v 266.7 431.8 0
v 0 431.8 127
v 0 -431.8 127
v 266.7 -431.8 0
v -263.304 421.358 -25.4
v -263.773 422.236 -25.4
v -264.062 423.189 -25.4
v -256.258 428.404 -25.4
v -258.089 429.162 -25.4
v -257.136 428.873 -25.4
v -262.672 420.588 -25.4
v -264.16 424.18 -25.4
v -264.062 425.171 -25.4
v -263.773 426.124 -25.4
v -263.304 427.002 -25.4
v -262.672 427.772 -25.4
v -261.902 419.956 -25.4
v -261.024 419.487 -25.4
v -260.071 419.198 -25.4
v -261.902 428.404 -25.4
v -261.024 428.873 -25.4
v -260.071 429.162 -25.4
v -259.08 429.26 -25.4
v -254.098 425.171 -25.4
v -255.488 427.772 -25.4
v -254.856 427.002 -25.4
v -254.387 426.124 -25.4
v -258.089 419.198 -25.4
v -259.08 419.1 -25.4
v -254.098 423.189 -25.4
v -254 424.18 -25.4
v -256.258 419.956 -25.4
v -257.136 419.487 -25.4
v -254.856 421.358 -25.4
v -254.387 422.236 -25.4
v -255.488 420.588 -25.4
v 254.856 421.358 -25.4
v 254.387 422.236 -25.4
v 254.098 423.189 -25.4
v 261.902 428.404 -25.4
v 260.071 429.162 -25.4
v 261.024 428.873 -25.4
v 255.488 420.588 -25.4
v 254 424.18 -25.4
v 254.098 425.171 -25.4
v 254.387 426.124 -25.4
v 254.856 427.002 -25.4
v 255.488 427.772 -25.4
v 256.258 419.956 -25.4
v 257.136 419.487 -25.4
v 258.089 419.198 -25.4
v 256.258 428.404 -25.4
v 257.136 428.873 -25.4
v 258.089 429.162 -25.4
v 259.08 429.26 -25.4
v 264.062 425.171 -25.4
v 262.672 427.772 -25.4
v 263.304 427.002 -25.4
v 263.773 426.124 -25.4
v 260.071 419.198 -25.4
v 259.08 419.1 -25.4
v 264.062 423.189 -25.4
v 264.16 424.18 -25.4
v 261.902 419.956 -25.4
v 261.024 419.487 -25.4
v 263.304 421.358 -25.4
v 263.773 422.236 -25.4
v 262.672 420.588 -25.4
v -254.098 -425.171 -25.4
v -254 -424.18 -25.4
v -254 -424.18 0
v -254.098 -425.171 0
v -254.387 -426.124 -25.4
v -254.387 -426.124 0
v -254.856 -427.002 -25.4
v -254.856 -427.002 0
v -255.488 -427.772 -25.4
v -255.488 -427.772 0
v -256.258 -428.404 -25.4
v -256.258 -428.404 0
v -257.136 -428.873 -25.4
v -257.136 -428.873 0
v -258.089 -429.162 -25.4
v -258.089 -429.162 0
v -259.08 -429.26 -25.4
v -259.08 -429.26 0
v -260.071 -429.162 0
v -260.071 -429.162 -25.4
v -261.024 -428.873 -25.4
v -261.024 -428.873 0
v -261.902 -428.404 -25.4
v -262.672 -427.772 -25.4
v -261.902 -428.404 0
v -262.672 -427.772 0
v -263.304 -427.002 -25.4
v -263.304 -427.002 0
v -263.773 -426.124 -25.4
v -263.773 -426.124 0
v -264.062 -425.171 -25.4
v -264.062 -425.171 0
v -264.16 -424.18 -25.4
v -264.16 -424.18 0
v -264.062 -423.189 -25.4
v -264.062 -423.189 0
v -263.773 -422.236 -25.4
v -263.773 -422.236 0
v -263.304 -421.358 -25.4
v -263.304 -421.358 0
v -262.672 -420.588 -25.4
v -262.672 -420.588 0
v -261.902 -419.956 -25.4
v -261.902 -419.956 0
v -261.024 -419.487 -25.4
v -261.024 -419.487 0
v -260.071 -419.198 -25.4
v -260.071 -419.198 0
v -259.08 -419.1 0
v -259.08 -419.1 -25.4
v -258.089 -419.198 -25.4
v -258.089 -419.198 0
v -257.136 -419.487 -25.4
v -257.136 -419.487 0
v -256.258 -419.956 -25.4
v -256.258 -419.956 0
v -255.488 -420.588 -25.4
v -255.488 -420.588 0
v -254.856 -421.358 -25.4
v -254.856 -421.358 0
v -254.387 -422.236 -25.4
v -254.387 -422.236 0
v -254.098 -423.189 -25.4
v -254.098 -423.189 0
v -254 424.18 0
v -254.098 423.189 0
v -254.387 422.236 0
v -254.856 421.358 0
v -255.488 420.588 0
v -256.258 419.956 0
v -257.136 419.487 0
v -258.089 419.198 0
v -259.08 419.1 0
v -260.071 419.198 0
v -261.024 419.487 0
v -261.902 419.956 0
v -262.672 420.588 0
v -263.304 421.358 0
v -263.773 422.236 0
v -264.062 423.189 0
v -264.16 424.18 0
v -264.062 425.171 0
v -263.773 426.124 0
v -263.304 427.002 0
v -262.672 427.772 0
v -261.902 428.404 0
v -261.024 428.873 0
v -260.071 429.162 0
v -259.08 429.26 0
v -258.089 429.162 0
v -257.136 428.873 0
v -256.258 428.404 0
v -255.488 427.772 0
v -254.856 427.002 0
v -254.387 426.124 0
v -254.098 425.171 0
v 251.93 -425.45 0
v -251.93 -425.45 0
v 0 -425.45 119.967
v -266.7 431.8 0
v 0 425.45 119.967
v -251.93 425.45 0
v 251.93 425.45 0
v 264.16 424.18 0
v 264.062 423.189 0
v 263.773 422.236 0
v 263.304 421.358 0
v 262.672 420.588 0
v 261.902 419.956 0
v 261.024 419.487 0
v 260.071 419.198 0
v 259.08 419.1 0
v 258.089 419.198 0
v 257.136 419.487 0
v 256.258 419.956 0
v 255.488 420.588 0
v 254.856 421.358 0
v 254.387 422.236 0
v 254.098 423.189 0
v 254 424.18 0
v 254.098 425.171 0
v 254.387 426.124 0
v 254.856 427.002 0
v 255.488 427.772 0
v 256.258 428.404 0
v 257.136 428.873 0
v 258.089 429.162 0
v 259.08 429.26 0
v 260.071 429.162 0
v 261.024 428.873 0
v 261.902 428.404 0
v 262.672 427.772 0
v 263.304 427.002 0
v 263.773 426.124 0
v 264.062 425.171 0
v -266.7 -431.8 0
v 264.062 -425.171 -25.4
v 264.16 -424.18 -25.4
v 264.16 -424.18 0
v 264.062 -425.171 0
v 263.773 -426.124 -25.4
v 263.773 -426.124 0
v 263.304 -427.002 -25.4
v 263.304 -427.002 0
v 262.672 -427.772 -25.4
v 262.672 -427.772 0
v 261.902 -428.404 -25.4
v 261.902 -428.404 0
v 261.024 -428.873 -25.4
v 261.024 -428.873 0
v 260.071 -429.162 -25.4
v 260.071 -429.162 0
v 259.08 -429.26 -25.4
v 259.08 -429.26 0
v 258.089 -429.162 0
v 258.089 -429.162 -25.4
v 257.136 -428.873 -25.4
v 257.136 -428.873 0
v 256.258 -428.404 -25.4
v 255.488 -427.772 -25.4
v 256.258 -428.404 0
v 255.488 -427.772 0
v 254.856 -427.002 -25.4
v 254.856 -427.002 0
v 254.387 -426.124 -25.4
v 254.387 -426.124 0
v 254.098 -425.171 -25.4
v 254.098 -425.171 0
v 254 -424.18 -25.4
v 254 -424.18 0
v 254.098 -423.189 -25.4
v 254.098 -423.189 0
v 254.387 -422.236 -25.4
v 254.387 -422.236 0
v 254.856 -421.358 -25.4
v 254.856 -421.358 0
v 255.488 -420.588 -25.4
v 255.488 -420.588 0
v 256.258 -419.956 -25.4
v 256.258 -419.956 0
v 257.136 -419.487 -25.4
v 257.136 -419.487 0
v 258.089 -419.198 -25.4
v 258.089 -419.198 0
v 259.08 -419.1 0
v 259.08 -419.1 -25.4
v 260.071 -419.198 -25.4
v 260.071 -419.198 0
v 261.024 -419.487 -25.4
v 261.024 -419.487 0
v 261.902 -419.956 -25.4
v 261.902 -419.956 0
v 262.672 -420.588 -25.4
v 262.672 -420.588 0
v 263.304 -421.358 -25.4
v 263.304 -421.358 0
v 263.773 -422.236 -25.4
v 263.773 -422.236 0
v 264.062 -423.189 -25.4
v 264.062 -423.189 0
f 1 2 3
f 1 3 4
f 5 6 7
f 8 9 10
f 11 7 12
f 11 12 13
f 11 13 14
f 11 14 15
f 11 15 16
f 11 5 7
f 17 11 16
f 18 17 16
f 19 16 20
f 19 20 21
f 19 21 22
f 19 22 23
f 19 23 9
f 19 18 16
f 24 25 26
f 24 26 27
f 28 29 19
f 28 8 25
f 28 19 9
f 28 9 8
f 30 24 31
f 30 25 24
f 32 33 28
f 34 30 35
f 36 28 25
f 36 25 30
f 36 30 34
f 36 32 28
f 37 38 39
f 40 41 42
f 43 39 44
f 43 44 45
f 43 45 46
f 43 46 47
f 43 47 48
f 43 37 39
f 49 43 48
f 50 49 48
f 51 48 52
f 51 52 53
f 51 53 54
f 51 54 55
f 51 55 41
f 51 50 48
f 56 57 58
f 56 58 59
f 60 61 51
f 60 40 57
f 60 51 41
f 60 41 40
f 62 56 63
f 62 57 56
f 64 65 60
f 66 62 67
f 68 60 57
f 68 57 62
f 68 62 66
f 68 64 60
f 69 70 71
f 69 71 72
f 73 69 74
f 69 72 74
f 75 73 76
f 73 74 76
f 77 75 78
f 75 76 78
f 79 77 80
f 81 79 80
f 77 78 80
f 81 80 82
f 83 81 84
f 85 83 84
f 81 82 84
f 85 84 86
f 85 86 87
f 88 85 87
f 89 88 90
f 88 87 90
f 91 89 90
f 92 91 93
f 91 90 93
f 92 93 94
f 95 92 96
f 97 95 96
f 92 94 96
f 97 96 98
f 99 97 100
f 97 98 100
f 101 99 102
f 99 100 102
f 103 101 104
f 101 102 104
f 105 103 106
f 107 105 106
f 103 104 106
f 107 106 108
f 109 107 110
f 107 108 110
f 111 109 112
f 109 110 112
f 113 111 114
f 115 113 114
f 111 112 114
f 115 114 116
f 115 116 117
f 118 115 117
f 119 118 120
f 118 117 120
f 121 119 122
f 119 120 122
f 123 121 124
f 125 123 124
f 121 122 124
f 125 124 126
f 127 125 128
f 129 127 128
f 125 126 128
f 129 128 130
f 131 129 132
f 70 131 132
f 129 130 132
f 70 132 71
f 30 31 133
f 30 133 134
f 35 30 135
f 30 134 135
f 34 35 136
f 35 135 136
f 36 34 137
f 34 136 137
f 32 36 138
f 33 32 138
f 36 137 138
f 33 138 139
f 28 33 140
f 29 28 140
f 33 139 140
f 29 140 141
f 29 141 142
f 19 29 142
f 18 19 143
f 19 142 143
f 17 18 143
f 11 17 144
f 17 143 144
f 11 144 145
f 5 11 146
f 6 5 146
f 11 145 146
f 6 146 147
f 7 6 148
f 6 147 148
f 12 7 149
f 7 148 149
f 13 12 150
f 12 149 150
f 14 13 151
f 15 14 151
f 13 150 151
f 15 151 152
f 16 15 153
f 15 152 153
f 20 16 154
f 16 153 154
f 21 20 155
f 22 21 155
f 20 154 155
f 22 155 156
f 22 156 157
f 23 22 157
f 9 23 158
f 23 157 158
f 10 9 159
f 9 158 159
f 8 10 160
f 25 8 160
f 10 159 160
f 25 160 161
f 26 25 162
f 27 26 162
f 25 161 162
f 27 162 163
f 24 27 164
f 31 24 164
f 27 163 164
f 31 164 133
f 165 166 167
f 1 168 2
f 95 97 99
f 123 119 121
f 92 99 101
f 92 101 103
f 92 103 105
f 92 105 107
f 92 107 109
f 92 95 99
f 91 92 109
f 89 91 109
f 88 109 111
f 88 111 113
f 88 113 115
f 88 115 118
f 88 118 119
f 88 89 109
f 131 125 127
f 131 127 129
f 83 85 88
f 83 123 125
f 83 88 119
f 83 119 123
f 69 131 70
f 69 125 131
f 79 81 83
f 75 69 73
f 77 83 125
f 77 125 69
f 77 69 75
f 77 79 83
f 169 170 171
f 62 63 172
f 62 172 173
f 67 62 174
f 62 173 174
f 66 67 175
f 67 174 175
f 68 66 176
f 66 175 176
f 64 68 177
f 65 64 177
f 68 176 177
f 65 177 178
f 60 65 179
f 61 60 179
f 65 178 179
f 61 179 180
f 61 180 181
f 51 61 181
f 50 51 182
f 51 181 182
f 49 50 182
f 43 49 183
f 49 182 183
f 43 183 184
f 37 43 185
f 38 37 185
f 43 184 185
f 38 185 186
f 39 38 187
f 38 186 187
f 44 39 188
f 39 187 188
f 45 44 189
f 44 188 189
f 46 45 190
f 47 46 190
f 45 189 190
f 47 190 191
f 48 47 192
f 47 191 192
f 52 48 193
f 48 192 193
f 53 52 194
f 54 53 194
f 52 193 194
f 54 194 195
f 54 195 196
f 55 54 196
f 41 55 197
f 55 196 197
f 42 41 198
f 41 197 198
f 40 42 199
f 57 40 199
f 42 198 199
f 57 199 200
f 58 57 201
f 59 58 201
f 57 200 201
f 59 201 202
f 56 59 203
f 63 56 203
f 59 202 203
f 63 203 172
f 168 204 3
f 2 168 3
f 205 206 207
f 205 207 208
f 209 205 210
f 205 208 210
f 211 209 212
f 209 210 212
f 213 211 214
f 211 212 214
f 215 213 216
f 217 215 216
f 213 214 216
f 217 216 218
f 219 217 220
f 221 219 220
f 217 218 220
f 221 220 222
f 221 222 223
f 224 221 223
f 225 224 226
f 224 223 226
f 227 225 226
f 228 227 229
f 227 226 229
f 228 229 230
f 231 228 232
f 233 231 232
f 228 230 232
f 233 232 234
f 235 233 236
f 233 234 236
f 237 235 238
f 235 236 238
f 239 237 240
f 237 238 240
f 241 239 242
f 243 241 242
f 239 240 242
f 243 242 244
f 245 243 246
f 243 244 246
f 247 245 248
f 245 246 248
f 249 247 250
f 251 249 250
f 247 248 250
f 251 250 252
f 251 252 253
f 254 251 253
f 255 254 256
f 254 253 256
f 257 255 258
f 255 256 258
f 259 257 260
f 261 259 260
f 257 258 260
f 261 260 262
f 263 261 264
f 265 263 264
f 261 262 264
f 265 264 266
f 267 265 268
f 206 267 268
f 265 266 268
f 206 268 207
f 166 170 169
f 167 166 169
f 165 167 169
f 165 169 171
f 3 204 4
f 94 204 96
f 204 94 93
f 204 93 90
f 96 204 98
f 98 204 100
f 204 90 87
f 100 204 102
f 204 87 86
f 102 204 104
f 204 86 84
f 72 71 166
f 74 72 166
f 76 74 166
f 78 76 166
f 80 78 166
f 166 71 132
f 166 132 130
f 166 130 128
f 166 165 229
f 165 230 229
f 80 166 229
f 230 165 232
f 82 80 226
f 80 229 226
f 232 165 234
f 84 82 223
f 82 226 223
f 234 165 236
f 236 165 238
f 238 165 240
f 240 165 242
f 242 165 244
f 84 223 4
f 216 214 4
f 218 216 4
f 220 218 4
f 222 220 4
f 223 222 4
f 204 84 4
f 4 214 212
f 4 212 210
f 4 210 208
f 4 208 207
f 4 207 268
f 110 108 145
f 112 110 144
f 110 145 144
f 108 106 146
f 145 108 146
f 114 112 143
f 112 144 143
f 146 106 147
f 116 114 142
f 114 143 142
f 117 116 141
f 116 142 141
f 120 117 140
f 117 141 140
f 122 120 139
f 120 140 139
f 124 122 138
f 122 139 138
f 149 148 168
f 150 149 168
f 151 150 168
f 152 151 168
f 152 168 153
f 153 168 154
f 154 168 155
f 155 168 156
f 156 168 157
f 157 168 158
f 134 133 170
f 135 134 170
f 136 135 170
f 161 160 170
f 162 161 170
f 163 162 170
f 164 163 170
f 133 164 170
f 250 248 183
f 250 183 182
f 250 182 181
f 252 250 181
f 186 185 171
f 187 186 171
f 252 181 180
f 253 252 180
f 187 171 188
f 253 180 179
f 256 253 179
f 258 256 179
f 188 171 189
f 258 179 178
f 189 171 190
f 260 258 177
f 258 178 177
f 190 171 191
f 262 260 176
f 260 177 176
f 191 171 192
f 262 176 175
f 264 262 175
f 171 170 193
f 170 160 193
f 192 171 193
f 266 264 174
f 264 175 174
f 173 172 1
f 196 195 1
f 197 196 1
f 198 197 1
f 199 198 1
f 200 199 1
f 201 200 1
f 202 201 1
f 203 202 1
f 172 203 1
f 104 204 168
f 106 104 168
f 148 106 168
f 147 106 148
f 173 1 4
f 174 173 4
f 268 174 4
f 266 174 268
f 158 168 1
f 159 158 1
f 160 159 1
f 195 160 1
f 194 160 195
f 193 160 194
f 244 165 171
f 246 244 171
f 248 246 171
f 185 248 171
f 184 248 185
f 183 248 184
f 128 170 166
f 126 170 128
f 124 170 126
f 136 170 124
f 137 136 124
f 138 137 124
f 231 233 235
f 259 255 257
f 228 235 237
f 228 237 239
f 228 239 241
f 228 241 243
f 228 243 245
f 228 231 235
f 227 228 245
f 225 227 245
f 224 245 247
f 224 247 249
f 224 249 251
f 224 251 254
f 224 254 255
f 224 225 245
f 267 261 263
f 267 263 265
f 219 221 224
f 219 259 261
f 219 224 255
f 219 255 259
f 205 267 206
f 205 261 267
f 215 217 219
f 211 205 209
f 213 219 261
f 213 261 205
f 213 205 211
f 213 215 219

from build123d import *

# Parameters (mm, degrees)
F0_W     = 533.4
F0_H     = 863.6
F1_DEPTH = 127
F3_DEPTH = 2540
F4_T     = -6.35
F5_R     = 5.08
F6_DEPTH = 25.4


with BuildPart() as f1:
    # F0 (on Top) → F1 (new body)
    with BuildSketch(Plane.XY):
        Rectangle(F0_W, F0_H)
    extrude(amount=F1_DEPTH)

    # F2 (on face) → F3 (cut)
    with BuildSketch(Plane.XZ.offset(431.8)):
        Polygon((-266.7, 0), (0, 127), (-266.7, 127), align=None)
        Polygon((266.7, 127), (0, 127), (266.7, 0), align=None)
    extrude(amount=-F3_DEPTH, mode=Mode.SUBTRACT)

    # F4
    f4_openings = [f1.faces().sort_by_distance(p)[0] for p in [
        (0, 0, 0),
    ]]
    offset(amount=F4_T, openings=f4_openings)

    # F5 (on face) → F6 (join)
    with BuildSketch(Plane(origin=(0, 0, 0), x_dir=(1, 0, 0), z_dir=(0, 0, -1))):
        with Locations((-259.08, 424.18)):
            Circle(F5_R)
        with Locations((259.08, 424.18)):
            Circle(F5_R)
        with Locations((259.08, -424.18)):
            Circle(F5_R)
        with Locations((-259.08, -424.18)):
            Circle(F5_R)
    extrude(amount=F6_DEPTH)


solid = f1.part
